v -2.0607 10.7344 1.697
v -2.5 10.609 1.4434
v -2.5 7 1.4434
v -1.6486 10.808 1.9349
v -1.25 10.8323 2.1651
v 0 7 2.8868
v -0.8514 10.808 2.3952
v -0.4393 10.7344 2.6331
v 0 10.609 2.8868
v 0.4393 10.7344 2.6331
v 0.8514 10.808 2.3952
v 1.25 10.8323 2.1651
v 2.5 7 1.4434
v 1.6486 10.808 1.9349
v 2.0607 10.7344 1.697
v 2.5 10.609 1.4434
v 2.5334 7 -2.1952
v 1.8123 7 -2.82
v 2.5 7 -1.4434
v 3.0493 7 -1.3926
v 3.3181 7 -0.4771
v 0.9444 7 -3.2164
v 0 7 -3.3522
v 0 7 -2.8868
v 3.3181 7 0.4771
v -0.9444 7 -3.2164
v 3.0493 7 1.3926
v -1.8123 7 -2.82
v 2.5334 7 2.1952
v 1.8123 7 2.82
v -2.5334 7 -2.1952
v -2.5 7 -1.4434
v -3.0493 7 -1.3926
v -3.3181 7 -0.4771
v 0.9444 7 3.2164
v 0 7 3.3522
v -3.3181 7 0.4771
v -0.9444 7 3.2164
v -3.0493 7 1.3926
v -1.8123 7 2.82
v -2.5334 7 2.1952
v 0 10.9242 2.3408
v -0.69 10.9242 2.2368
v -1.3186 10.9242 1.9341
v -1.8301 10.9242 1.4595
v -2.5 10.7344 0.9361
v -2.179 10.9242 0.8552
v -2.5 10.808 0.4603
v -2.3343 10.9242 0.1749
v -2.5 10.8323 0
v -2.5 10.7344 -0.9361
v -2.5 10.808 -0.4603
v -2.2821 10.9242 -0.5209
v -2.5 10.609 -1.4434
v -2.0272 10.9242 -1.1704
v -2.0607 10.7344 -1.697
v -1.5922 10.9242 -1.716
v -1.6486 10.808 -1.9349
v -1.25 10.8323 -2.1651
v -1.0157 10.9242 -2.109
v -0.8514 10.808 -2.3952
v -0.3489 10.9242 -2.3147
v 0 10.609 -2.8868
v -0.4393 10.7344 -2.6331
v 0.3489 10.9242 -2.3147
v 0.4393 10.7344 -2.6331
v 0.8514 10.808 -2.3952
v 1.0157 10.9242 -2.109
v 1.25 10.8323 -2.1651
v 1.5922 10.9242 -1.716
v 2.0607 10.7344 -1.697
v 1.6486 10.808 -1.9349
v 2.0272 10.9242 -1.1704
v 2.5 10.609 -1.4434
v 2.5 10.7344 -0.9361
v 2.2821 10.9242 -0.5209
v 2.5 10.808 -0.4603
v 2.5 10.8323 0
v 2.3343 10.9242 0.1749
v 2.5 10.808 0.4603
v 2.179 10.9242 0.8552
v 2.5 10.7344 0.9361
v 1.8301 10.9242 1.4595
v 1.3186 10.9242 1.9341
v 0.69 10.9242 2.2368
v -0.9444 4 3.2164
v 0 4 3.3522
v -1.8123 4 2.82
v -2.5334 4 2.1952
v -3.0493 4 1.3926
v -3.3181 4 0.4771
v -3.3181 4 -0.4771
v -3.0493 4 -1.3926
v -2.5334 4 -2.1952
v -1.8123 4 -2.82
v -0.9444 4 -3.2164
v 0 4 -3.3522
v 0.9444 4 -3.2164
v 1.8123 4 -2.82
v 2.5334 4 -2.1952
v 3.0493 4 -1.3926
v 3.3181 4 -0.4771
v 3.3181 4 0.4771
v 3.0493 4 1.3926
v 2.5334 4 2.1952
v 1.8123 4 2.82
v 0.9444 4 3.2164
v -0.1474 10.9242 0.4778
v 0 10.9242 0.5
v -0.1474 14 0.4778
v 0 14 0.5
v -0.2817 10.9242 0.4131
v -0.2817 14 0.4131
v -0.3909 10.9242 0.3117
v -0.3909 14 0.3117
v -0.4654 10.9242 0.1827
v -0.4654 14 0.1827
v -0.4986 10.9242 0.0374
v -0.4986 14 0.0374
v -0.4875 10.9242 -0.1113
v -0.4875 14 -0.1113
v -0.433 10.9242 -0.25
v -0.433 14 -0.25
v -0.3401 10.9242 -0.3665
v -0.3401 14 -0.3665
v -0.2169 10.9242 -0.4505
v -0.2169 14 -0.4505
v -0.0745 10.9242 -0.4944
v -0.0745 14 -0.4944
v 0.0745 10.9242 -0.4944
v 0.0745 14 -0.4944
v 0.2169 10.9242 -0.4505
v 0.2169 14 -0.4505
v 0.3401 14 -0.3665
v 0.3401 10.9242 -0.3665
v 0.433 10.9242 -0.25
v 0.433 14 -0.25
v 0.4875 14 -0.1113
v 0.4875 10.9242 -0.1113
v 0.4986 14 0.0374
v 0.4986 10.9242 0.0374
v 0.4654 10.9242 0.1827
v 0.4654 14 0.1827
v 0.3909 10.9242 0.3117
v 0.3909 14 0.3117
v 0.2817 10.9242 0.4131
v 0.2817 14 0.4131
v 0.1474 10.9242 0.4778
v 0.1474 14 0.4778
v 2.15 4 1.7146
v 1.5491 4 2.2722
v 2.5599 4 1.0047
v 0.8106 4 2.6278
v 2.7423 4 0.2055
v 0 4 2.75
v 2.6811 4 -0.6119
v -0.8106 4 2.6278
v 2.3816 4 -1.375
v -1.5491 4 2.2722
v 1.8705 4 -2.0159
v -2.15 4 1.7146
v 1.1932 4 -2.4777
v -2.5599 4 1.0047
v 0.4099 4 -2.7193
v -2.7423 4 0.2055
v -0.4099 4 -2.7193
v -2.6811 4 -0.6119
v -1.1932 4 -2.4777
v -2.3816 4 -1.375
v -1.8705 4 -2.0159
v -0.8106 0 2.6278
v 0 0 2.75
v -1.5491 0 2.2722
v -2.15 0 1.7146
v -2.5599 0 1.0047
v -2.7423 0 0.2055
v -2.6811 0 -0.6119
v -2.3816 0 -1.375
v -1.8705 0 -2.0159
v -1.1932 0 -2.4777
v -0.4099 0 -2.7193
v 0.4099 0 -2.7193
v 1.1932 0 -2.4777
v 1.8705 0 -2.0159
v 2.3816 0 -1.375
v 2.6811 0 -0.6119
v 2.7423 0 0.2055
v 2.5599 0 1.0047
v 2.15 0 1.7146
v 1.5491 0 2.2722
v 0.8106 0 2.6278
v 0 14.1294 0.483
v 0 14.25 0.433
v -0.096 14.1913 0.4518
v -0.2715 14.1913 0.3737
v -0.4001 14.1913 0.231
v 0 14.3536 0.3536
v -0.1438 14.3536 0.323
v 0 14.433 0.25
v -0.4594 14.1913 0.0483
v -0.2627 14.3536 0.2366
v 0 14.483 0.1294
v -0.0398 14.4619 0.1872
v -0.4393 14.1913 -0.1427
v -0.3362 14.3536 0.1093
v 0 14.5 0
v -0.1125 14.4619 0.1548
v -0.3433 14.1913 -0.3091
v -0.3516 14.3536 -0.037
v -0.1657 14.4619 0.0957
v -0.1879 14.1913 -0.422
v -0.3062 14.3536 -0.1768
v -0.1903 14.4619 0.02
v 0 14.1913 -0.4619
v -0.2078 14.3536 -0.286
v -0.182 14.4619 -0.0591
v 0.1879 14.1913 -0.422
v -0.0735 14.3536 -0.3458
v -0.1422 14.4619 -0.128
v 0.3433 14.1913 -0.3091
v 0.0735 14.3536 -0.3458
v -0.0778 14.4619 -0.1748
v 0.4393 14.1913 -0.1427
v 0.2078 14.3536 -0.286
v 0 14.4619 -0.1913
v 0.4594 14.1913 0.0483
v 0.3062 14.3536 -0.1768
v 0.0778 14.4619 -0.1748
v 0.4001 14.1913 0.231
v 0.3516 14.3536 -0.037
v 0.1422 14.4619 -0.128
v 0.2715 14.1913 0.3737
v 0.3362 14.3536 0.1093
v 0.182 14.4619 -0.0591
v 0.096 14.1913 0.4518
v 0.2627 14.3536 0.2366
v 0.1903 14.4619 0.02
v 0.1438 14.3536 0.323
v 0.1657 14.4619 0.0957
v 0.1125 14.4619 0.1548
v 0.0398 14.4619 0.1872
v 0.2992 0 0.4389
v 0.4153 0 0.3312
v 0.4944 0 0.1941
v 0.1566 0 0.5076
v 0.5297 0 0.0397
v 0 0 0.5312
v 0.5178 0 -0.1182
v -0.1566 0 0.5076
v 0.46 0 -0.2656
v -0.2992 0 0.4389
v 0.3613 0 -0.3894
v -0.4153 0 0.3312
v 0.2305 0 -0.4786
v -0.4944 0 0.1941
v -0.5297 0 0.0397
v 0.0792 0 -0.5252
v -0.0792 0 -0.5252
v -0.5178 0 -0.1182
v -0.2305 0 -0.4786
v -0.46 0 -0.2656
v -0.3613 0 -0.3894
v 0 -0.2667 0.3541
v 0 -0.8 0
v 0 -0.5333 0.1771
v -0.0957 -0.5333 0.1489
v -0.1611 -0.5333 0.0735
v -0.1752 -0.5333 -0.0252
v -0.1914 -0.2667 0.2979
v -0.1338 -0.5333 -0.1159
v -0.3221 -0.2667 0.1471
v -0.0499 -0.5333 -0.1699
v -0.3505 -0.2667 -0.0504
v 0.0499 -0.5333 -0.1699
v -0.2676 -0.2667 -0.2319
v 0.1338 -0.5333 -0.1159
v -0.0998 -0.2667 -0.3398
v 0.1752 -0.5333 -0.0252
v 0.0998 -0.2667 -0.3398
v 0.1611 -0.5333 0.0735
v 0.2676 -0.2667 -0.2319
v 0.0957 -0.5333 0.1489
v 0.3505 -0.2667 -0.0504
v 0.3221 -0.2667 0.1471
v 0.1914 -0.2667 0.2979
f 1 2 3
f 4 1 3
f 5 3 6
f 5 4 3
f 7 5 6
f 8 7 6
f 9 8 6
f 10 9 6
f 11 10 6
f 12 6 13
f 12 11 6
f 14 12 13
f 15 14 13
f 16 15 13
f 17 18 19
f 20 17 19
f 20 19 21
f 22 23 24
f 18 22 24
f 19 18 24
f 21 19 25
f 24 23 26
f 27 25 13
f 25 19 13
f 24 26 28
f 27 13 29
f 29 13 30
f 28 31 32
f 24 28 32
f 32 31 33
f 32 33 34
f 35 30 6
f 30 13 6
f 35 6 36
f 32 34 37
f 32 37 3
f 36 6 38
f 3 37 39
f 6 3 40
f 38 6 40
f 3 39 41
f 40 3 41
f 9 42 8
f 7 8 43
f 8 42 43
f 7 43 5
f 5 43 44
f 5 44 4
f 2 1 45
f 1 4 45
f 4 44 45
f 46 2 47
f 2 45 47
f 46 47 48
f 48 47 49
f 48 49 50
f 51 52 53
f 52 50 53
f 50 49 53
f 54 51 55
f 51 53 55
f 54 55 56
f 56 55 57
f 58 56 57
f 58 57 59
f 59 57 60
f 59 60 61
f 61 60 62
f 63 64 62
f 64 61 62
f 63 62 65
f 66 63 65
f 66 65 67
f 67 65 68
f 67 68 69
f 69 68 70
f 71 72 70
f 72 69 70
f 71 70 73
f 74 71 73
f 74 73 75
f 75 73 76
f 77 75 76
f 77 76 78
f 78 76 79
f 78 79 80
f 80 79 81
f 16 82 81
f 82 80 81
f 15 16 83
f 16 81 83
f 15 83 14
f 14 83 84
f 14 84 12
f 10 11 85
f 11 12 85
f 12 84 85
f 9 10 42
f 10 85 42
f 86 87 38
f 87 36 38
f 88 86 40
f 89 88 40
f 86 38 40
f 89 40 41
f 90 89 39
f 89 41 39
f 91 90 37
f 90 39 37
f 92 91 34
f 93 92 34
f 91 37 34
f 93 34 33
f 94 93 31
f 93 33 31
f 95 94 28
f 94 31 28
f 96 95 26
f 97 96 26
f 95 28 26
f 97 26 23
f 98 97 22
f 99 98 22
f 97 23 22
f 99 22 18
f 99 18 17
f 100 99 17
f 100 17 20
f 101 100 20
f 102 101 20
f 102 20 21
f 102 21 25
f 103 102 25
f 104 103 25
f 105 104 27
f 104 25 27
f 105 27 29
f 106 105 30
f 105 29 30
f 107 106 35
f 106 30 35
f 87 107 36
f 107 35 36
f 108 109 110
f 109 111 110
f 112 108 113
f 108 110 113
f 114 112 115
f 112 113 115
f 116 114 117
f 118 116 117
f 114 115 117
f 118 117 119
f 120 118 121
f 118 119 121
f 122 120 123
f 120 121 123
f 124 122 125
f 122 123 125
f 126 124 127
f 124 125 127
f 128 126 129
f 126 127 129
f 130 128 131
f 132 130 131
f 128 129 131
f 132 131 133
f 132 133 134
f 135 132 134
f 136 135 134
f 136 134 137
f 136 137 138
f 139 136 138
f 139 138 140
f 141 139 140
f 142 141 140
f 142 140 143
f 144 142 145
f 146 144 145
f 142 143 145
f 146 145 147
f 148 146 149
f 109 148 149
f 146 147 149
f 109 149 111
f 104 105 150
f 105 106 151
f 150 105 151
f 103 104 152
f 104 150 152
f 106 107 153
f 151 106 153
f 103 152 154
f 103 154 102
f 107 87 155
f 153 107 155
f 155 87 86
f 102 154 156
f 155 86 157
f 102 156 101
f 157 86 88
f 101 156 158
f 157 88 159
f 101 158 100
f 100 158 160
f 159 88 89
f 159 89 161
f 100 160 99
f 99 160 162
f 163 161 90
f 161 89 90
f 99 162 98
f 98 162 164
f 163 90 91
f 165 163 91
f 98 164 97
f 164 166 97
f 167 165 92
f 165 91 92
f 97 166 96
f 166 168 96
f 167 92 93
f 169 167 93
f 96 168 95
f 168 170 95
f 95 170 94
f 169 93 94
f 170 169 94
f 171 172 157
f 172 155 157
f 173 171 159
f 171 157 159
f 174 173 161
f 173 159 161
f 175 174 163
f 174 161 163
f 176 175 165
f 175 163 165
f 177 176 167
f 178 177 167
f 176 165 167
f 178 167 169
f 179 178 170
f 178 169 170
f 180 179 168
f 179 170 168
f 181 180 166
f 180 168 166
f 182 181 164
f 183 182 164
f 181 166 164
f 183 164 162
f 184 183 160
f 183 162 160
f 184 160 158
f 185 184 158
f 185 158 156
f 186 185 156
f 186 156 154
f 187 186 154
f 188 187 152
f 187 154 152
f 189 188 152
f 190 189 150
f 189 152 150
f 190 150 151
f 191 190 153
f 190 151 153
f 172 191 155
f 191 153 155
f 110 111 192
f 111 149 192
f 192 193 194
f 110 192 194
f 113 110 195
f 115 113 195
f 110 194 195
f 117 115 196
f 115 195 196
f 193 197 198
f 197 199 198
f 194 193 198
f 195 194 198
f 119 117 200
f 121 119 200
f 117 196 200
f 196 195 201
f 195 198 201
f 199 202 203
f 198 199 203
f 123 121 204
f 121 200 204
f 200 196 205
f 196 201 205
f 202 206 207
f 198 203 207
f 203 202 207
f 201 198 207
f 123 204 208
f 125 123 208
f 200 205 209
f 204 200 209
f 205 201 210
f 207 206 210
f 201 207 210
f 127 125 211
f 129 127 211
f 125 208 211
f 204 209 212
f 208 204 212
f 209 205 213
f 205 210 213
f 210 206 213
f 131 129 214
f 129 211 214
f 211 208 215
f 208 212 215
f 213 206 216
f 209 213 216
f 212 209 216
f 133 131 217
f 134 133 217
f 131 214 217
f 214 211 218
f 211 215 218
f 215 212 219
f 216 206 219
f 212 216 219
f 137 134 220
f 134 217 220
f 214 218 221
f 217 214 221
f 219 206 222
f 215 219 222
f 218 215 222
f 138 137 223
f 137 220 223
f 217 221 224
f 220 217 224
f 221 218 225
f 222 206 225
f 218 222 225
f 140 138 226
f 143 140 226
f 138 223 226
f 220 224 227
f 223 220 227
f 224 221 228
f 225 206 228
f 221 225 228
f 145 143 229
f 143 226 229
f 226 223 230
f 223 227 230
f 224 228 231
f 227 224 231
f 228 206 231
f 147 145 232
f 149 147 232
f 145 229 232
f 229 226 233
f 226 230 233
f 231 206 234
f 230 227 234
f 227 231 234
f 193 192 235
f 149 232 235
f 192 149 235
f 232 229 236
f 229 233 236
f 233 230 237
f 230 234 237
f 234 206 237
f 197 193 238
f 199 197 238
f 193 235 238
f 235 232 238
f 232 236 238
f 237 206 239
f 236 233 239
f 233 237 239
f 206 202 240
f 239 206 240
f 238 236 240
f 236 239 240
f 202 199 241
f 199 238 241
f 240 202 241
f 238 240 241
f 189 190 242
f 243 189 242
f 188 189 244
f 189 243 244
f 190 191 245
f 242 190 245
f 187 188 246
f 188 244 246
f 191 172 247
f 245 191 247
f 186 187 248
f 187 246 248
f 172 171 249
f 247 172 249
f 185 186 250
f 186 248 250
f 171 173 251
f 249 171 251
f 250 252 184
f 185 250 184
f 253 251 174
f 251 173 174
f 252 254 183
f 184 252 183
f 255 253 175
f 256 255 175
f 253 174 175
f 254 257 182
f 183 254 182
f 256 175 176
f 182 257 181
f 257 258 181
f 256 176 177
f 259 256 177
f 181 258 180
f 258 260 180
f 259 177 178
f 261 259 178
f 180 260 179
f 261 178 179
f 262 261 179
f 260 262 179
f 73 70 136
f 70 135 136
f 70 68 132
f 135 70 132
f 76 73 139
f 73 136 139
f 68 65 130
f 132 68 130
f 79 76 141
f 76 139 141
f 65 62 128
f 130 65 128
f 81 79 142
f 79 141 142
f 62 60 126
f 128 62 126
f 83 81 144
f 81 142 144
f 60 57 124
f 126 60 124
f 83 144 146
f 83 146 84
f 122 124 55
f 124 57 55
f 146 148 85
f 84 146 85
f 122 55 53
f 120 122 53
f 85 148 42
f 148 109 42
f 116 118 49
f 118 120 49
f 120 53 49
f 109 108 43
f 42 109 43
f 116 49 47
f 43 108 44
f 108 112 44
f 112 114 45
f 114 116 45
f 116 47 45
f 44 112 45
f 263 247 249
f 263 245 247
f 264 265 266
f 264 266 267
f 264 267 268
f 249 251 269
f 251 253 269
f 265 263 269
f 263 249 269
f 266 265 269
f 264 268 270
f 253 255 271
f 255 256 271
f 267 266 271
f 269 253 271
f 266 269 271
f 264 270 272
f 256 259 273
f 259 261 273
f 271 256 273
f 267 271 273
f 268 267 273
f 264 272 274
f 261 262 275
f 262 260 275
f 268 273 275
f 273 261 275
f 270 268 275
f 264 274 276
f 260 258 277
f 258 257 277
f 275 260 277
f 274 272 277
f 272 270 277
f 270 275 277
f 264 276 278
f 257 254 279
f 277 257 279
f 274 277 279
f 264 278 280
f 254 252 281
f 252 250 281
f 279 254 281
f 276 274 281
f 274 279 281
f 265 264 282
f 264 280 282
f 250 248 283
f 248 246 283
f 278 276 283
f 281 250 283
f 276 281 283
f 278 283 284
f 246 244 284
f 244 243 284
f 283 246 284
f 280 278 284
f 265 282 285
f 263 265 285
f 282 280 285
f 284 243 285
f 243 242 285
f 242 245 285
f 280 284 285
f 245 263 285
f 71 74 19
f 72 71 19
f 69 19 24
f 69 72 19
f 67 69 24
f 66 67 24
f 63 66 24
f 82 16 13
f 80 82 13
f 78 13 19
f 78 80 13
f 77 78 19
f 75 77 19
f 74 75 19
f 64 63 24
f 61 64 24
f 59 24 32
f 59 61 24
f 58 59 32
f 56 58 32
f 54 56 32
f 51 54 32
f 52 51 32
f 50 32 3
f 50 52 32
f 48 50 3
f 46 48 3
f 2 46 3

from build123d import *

# Parameters (mm, degrees)
ESQUISSE2_OUTSIDE_W     = 12.304
ESQUISSE2_OUTSIDE_H     = 12.304
ENL_V_MAT_EXTRU_1_DEPTH = 3.924186047


with BuildPart() as part:
    # Esquisse1 → Base-Révolution (revolve)
    with BuildSketch(Plane.XY, mode=Mode.PRIVATE) as base_r_volution_sk:
        with BuildLine():
            Line((-0.531153927, 0), (-2.75, 0))
            Line((-2.75, 0), (-2.75, 4))
            Line((-2.75, 4), (-3.352191691, 4))
            Line((-3.352191691, 4), (-3.352191691, 7))
            Line((-3.352191691, 7), (-3, 7))
            Line((-3, 7), (-3, 10.543617096))
            Line((-3, 10.543617096), (-2.340835241, 10.924186047))
            Line((-2.340835241, 10.924186047), (-0.5, 10.924186047))
            Line((-0.5, 10.924186047), (-0.5, 14))
            ThreePointArc((-0.5, 14), (-0.353553391, 14.353553391), (0, 14.5))
            Line((0, 14.5), (0, -0.8))
            Line((0, -0.8), (-0.531153927, 0))
        make_face()
    revolve(base_r_volution_sk.sketch.rotate(Axis((0, 14.968764899, 0), (0, -1, 0)), 270), axis=Axis((0, 14.968764899, 0), (0, -1, 0)))

    # Esquisse2 outside → Enlèv. mat.-Extru.1 (cut)
    with BuildSketch(Plane(origin=(0, 10.924186047, 0), x_dir=(-1, 0, 0), z_dir=(0, 1, 0))):
        Rectangle(ESQUISSE2_OUTSIDE_W, ESQUISSE2_OUTSIDE_H)
        Polygon((0, 2.886751346), (-2.5, 1.443375673), (-2.5, -1.443375673), (0, -2.886751346), (2.5, -1.443375673), (2.5, 1.443375673), align=None, mode=Mode.SUBTRACT)
    extrude(amount=-ENL_V_MAT_EXTRU_1_DEPTH, mode=Mode.SUBTRACT)


solid = part.part
